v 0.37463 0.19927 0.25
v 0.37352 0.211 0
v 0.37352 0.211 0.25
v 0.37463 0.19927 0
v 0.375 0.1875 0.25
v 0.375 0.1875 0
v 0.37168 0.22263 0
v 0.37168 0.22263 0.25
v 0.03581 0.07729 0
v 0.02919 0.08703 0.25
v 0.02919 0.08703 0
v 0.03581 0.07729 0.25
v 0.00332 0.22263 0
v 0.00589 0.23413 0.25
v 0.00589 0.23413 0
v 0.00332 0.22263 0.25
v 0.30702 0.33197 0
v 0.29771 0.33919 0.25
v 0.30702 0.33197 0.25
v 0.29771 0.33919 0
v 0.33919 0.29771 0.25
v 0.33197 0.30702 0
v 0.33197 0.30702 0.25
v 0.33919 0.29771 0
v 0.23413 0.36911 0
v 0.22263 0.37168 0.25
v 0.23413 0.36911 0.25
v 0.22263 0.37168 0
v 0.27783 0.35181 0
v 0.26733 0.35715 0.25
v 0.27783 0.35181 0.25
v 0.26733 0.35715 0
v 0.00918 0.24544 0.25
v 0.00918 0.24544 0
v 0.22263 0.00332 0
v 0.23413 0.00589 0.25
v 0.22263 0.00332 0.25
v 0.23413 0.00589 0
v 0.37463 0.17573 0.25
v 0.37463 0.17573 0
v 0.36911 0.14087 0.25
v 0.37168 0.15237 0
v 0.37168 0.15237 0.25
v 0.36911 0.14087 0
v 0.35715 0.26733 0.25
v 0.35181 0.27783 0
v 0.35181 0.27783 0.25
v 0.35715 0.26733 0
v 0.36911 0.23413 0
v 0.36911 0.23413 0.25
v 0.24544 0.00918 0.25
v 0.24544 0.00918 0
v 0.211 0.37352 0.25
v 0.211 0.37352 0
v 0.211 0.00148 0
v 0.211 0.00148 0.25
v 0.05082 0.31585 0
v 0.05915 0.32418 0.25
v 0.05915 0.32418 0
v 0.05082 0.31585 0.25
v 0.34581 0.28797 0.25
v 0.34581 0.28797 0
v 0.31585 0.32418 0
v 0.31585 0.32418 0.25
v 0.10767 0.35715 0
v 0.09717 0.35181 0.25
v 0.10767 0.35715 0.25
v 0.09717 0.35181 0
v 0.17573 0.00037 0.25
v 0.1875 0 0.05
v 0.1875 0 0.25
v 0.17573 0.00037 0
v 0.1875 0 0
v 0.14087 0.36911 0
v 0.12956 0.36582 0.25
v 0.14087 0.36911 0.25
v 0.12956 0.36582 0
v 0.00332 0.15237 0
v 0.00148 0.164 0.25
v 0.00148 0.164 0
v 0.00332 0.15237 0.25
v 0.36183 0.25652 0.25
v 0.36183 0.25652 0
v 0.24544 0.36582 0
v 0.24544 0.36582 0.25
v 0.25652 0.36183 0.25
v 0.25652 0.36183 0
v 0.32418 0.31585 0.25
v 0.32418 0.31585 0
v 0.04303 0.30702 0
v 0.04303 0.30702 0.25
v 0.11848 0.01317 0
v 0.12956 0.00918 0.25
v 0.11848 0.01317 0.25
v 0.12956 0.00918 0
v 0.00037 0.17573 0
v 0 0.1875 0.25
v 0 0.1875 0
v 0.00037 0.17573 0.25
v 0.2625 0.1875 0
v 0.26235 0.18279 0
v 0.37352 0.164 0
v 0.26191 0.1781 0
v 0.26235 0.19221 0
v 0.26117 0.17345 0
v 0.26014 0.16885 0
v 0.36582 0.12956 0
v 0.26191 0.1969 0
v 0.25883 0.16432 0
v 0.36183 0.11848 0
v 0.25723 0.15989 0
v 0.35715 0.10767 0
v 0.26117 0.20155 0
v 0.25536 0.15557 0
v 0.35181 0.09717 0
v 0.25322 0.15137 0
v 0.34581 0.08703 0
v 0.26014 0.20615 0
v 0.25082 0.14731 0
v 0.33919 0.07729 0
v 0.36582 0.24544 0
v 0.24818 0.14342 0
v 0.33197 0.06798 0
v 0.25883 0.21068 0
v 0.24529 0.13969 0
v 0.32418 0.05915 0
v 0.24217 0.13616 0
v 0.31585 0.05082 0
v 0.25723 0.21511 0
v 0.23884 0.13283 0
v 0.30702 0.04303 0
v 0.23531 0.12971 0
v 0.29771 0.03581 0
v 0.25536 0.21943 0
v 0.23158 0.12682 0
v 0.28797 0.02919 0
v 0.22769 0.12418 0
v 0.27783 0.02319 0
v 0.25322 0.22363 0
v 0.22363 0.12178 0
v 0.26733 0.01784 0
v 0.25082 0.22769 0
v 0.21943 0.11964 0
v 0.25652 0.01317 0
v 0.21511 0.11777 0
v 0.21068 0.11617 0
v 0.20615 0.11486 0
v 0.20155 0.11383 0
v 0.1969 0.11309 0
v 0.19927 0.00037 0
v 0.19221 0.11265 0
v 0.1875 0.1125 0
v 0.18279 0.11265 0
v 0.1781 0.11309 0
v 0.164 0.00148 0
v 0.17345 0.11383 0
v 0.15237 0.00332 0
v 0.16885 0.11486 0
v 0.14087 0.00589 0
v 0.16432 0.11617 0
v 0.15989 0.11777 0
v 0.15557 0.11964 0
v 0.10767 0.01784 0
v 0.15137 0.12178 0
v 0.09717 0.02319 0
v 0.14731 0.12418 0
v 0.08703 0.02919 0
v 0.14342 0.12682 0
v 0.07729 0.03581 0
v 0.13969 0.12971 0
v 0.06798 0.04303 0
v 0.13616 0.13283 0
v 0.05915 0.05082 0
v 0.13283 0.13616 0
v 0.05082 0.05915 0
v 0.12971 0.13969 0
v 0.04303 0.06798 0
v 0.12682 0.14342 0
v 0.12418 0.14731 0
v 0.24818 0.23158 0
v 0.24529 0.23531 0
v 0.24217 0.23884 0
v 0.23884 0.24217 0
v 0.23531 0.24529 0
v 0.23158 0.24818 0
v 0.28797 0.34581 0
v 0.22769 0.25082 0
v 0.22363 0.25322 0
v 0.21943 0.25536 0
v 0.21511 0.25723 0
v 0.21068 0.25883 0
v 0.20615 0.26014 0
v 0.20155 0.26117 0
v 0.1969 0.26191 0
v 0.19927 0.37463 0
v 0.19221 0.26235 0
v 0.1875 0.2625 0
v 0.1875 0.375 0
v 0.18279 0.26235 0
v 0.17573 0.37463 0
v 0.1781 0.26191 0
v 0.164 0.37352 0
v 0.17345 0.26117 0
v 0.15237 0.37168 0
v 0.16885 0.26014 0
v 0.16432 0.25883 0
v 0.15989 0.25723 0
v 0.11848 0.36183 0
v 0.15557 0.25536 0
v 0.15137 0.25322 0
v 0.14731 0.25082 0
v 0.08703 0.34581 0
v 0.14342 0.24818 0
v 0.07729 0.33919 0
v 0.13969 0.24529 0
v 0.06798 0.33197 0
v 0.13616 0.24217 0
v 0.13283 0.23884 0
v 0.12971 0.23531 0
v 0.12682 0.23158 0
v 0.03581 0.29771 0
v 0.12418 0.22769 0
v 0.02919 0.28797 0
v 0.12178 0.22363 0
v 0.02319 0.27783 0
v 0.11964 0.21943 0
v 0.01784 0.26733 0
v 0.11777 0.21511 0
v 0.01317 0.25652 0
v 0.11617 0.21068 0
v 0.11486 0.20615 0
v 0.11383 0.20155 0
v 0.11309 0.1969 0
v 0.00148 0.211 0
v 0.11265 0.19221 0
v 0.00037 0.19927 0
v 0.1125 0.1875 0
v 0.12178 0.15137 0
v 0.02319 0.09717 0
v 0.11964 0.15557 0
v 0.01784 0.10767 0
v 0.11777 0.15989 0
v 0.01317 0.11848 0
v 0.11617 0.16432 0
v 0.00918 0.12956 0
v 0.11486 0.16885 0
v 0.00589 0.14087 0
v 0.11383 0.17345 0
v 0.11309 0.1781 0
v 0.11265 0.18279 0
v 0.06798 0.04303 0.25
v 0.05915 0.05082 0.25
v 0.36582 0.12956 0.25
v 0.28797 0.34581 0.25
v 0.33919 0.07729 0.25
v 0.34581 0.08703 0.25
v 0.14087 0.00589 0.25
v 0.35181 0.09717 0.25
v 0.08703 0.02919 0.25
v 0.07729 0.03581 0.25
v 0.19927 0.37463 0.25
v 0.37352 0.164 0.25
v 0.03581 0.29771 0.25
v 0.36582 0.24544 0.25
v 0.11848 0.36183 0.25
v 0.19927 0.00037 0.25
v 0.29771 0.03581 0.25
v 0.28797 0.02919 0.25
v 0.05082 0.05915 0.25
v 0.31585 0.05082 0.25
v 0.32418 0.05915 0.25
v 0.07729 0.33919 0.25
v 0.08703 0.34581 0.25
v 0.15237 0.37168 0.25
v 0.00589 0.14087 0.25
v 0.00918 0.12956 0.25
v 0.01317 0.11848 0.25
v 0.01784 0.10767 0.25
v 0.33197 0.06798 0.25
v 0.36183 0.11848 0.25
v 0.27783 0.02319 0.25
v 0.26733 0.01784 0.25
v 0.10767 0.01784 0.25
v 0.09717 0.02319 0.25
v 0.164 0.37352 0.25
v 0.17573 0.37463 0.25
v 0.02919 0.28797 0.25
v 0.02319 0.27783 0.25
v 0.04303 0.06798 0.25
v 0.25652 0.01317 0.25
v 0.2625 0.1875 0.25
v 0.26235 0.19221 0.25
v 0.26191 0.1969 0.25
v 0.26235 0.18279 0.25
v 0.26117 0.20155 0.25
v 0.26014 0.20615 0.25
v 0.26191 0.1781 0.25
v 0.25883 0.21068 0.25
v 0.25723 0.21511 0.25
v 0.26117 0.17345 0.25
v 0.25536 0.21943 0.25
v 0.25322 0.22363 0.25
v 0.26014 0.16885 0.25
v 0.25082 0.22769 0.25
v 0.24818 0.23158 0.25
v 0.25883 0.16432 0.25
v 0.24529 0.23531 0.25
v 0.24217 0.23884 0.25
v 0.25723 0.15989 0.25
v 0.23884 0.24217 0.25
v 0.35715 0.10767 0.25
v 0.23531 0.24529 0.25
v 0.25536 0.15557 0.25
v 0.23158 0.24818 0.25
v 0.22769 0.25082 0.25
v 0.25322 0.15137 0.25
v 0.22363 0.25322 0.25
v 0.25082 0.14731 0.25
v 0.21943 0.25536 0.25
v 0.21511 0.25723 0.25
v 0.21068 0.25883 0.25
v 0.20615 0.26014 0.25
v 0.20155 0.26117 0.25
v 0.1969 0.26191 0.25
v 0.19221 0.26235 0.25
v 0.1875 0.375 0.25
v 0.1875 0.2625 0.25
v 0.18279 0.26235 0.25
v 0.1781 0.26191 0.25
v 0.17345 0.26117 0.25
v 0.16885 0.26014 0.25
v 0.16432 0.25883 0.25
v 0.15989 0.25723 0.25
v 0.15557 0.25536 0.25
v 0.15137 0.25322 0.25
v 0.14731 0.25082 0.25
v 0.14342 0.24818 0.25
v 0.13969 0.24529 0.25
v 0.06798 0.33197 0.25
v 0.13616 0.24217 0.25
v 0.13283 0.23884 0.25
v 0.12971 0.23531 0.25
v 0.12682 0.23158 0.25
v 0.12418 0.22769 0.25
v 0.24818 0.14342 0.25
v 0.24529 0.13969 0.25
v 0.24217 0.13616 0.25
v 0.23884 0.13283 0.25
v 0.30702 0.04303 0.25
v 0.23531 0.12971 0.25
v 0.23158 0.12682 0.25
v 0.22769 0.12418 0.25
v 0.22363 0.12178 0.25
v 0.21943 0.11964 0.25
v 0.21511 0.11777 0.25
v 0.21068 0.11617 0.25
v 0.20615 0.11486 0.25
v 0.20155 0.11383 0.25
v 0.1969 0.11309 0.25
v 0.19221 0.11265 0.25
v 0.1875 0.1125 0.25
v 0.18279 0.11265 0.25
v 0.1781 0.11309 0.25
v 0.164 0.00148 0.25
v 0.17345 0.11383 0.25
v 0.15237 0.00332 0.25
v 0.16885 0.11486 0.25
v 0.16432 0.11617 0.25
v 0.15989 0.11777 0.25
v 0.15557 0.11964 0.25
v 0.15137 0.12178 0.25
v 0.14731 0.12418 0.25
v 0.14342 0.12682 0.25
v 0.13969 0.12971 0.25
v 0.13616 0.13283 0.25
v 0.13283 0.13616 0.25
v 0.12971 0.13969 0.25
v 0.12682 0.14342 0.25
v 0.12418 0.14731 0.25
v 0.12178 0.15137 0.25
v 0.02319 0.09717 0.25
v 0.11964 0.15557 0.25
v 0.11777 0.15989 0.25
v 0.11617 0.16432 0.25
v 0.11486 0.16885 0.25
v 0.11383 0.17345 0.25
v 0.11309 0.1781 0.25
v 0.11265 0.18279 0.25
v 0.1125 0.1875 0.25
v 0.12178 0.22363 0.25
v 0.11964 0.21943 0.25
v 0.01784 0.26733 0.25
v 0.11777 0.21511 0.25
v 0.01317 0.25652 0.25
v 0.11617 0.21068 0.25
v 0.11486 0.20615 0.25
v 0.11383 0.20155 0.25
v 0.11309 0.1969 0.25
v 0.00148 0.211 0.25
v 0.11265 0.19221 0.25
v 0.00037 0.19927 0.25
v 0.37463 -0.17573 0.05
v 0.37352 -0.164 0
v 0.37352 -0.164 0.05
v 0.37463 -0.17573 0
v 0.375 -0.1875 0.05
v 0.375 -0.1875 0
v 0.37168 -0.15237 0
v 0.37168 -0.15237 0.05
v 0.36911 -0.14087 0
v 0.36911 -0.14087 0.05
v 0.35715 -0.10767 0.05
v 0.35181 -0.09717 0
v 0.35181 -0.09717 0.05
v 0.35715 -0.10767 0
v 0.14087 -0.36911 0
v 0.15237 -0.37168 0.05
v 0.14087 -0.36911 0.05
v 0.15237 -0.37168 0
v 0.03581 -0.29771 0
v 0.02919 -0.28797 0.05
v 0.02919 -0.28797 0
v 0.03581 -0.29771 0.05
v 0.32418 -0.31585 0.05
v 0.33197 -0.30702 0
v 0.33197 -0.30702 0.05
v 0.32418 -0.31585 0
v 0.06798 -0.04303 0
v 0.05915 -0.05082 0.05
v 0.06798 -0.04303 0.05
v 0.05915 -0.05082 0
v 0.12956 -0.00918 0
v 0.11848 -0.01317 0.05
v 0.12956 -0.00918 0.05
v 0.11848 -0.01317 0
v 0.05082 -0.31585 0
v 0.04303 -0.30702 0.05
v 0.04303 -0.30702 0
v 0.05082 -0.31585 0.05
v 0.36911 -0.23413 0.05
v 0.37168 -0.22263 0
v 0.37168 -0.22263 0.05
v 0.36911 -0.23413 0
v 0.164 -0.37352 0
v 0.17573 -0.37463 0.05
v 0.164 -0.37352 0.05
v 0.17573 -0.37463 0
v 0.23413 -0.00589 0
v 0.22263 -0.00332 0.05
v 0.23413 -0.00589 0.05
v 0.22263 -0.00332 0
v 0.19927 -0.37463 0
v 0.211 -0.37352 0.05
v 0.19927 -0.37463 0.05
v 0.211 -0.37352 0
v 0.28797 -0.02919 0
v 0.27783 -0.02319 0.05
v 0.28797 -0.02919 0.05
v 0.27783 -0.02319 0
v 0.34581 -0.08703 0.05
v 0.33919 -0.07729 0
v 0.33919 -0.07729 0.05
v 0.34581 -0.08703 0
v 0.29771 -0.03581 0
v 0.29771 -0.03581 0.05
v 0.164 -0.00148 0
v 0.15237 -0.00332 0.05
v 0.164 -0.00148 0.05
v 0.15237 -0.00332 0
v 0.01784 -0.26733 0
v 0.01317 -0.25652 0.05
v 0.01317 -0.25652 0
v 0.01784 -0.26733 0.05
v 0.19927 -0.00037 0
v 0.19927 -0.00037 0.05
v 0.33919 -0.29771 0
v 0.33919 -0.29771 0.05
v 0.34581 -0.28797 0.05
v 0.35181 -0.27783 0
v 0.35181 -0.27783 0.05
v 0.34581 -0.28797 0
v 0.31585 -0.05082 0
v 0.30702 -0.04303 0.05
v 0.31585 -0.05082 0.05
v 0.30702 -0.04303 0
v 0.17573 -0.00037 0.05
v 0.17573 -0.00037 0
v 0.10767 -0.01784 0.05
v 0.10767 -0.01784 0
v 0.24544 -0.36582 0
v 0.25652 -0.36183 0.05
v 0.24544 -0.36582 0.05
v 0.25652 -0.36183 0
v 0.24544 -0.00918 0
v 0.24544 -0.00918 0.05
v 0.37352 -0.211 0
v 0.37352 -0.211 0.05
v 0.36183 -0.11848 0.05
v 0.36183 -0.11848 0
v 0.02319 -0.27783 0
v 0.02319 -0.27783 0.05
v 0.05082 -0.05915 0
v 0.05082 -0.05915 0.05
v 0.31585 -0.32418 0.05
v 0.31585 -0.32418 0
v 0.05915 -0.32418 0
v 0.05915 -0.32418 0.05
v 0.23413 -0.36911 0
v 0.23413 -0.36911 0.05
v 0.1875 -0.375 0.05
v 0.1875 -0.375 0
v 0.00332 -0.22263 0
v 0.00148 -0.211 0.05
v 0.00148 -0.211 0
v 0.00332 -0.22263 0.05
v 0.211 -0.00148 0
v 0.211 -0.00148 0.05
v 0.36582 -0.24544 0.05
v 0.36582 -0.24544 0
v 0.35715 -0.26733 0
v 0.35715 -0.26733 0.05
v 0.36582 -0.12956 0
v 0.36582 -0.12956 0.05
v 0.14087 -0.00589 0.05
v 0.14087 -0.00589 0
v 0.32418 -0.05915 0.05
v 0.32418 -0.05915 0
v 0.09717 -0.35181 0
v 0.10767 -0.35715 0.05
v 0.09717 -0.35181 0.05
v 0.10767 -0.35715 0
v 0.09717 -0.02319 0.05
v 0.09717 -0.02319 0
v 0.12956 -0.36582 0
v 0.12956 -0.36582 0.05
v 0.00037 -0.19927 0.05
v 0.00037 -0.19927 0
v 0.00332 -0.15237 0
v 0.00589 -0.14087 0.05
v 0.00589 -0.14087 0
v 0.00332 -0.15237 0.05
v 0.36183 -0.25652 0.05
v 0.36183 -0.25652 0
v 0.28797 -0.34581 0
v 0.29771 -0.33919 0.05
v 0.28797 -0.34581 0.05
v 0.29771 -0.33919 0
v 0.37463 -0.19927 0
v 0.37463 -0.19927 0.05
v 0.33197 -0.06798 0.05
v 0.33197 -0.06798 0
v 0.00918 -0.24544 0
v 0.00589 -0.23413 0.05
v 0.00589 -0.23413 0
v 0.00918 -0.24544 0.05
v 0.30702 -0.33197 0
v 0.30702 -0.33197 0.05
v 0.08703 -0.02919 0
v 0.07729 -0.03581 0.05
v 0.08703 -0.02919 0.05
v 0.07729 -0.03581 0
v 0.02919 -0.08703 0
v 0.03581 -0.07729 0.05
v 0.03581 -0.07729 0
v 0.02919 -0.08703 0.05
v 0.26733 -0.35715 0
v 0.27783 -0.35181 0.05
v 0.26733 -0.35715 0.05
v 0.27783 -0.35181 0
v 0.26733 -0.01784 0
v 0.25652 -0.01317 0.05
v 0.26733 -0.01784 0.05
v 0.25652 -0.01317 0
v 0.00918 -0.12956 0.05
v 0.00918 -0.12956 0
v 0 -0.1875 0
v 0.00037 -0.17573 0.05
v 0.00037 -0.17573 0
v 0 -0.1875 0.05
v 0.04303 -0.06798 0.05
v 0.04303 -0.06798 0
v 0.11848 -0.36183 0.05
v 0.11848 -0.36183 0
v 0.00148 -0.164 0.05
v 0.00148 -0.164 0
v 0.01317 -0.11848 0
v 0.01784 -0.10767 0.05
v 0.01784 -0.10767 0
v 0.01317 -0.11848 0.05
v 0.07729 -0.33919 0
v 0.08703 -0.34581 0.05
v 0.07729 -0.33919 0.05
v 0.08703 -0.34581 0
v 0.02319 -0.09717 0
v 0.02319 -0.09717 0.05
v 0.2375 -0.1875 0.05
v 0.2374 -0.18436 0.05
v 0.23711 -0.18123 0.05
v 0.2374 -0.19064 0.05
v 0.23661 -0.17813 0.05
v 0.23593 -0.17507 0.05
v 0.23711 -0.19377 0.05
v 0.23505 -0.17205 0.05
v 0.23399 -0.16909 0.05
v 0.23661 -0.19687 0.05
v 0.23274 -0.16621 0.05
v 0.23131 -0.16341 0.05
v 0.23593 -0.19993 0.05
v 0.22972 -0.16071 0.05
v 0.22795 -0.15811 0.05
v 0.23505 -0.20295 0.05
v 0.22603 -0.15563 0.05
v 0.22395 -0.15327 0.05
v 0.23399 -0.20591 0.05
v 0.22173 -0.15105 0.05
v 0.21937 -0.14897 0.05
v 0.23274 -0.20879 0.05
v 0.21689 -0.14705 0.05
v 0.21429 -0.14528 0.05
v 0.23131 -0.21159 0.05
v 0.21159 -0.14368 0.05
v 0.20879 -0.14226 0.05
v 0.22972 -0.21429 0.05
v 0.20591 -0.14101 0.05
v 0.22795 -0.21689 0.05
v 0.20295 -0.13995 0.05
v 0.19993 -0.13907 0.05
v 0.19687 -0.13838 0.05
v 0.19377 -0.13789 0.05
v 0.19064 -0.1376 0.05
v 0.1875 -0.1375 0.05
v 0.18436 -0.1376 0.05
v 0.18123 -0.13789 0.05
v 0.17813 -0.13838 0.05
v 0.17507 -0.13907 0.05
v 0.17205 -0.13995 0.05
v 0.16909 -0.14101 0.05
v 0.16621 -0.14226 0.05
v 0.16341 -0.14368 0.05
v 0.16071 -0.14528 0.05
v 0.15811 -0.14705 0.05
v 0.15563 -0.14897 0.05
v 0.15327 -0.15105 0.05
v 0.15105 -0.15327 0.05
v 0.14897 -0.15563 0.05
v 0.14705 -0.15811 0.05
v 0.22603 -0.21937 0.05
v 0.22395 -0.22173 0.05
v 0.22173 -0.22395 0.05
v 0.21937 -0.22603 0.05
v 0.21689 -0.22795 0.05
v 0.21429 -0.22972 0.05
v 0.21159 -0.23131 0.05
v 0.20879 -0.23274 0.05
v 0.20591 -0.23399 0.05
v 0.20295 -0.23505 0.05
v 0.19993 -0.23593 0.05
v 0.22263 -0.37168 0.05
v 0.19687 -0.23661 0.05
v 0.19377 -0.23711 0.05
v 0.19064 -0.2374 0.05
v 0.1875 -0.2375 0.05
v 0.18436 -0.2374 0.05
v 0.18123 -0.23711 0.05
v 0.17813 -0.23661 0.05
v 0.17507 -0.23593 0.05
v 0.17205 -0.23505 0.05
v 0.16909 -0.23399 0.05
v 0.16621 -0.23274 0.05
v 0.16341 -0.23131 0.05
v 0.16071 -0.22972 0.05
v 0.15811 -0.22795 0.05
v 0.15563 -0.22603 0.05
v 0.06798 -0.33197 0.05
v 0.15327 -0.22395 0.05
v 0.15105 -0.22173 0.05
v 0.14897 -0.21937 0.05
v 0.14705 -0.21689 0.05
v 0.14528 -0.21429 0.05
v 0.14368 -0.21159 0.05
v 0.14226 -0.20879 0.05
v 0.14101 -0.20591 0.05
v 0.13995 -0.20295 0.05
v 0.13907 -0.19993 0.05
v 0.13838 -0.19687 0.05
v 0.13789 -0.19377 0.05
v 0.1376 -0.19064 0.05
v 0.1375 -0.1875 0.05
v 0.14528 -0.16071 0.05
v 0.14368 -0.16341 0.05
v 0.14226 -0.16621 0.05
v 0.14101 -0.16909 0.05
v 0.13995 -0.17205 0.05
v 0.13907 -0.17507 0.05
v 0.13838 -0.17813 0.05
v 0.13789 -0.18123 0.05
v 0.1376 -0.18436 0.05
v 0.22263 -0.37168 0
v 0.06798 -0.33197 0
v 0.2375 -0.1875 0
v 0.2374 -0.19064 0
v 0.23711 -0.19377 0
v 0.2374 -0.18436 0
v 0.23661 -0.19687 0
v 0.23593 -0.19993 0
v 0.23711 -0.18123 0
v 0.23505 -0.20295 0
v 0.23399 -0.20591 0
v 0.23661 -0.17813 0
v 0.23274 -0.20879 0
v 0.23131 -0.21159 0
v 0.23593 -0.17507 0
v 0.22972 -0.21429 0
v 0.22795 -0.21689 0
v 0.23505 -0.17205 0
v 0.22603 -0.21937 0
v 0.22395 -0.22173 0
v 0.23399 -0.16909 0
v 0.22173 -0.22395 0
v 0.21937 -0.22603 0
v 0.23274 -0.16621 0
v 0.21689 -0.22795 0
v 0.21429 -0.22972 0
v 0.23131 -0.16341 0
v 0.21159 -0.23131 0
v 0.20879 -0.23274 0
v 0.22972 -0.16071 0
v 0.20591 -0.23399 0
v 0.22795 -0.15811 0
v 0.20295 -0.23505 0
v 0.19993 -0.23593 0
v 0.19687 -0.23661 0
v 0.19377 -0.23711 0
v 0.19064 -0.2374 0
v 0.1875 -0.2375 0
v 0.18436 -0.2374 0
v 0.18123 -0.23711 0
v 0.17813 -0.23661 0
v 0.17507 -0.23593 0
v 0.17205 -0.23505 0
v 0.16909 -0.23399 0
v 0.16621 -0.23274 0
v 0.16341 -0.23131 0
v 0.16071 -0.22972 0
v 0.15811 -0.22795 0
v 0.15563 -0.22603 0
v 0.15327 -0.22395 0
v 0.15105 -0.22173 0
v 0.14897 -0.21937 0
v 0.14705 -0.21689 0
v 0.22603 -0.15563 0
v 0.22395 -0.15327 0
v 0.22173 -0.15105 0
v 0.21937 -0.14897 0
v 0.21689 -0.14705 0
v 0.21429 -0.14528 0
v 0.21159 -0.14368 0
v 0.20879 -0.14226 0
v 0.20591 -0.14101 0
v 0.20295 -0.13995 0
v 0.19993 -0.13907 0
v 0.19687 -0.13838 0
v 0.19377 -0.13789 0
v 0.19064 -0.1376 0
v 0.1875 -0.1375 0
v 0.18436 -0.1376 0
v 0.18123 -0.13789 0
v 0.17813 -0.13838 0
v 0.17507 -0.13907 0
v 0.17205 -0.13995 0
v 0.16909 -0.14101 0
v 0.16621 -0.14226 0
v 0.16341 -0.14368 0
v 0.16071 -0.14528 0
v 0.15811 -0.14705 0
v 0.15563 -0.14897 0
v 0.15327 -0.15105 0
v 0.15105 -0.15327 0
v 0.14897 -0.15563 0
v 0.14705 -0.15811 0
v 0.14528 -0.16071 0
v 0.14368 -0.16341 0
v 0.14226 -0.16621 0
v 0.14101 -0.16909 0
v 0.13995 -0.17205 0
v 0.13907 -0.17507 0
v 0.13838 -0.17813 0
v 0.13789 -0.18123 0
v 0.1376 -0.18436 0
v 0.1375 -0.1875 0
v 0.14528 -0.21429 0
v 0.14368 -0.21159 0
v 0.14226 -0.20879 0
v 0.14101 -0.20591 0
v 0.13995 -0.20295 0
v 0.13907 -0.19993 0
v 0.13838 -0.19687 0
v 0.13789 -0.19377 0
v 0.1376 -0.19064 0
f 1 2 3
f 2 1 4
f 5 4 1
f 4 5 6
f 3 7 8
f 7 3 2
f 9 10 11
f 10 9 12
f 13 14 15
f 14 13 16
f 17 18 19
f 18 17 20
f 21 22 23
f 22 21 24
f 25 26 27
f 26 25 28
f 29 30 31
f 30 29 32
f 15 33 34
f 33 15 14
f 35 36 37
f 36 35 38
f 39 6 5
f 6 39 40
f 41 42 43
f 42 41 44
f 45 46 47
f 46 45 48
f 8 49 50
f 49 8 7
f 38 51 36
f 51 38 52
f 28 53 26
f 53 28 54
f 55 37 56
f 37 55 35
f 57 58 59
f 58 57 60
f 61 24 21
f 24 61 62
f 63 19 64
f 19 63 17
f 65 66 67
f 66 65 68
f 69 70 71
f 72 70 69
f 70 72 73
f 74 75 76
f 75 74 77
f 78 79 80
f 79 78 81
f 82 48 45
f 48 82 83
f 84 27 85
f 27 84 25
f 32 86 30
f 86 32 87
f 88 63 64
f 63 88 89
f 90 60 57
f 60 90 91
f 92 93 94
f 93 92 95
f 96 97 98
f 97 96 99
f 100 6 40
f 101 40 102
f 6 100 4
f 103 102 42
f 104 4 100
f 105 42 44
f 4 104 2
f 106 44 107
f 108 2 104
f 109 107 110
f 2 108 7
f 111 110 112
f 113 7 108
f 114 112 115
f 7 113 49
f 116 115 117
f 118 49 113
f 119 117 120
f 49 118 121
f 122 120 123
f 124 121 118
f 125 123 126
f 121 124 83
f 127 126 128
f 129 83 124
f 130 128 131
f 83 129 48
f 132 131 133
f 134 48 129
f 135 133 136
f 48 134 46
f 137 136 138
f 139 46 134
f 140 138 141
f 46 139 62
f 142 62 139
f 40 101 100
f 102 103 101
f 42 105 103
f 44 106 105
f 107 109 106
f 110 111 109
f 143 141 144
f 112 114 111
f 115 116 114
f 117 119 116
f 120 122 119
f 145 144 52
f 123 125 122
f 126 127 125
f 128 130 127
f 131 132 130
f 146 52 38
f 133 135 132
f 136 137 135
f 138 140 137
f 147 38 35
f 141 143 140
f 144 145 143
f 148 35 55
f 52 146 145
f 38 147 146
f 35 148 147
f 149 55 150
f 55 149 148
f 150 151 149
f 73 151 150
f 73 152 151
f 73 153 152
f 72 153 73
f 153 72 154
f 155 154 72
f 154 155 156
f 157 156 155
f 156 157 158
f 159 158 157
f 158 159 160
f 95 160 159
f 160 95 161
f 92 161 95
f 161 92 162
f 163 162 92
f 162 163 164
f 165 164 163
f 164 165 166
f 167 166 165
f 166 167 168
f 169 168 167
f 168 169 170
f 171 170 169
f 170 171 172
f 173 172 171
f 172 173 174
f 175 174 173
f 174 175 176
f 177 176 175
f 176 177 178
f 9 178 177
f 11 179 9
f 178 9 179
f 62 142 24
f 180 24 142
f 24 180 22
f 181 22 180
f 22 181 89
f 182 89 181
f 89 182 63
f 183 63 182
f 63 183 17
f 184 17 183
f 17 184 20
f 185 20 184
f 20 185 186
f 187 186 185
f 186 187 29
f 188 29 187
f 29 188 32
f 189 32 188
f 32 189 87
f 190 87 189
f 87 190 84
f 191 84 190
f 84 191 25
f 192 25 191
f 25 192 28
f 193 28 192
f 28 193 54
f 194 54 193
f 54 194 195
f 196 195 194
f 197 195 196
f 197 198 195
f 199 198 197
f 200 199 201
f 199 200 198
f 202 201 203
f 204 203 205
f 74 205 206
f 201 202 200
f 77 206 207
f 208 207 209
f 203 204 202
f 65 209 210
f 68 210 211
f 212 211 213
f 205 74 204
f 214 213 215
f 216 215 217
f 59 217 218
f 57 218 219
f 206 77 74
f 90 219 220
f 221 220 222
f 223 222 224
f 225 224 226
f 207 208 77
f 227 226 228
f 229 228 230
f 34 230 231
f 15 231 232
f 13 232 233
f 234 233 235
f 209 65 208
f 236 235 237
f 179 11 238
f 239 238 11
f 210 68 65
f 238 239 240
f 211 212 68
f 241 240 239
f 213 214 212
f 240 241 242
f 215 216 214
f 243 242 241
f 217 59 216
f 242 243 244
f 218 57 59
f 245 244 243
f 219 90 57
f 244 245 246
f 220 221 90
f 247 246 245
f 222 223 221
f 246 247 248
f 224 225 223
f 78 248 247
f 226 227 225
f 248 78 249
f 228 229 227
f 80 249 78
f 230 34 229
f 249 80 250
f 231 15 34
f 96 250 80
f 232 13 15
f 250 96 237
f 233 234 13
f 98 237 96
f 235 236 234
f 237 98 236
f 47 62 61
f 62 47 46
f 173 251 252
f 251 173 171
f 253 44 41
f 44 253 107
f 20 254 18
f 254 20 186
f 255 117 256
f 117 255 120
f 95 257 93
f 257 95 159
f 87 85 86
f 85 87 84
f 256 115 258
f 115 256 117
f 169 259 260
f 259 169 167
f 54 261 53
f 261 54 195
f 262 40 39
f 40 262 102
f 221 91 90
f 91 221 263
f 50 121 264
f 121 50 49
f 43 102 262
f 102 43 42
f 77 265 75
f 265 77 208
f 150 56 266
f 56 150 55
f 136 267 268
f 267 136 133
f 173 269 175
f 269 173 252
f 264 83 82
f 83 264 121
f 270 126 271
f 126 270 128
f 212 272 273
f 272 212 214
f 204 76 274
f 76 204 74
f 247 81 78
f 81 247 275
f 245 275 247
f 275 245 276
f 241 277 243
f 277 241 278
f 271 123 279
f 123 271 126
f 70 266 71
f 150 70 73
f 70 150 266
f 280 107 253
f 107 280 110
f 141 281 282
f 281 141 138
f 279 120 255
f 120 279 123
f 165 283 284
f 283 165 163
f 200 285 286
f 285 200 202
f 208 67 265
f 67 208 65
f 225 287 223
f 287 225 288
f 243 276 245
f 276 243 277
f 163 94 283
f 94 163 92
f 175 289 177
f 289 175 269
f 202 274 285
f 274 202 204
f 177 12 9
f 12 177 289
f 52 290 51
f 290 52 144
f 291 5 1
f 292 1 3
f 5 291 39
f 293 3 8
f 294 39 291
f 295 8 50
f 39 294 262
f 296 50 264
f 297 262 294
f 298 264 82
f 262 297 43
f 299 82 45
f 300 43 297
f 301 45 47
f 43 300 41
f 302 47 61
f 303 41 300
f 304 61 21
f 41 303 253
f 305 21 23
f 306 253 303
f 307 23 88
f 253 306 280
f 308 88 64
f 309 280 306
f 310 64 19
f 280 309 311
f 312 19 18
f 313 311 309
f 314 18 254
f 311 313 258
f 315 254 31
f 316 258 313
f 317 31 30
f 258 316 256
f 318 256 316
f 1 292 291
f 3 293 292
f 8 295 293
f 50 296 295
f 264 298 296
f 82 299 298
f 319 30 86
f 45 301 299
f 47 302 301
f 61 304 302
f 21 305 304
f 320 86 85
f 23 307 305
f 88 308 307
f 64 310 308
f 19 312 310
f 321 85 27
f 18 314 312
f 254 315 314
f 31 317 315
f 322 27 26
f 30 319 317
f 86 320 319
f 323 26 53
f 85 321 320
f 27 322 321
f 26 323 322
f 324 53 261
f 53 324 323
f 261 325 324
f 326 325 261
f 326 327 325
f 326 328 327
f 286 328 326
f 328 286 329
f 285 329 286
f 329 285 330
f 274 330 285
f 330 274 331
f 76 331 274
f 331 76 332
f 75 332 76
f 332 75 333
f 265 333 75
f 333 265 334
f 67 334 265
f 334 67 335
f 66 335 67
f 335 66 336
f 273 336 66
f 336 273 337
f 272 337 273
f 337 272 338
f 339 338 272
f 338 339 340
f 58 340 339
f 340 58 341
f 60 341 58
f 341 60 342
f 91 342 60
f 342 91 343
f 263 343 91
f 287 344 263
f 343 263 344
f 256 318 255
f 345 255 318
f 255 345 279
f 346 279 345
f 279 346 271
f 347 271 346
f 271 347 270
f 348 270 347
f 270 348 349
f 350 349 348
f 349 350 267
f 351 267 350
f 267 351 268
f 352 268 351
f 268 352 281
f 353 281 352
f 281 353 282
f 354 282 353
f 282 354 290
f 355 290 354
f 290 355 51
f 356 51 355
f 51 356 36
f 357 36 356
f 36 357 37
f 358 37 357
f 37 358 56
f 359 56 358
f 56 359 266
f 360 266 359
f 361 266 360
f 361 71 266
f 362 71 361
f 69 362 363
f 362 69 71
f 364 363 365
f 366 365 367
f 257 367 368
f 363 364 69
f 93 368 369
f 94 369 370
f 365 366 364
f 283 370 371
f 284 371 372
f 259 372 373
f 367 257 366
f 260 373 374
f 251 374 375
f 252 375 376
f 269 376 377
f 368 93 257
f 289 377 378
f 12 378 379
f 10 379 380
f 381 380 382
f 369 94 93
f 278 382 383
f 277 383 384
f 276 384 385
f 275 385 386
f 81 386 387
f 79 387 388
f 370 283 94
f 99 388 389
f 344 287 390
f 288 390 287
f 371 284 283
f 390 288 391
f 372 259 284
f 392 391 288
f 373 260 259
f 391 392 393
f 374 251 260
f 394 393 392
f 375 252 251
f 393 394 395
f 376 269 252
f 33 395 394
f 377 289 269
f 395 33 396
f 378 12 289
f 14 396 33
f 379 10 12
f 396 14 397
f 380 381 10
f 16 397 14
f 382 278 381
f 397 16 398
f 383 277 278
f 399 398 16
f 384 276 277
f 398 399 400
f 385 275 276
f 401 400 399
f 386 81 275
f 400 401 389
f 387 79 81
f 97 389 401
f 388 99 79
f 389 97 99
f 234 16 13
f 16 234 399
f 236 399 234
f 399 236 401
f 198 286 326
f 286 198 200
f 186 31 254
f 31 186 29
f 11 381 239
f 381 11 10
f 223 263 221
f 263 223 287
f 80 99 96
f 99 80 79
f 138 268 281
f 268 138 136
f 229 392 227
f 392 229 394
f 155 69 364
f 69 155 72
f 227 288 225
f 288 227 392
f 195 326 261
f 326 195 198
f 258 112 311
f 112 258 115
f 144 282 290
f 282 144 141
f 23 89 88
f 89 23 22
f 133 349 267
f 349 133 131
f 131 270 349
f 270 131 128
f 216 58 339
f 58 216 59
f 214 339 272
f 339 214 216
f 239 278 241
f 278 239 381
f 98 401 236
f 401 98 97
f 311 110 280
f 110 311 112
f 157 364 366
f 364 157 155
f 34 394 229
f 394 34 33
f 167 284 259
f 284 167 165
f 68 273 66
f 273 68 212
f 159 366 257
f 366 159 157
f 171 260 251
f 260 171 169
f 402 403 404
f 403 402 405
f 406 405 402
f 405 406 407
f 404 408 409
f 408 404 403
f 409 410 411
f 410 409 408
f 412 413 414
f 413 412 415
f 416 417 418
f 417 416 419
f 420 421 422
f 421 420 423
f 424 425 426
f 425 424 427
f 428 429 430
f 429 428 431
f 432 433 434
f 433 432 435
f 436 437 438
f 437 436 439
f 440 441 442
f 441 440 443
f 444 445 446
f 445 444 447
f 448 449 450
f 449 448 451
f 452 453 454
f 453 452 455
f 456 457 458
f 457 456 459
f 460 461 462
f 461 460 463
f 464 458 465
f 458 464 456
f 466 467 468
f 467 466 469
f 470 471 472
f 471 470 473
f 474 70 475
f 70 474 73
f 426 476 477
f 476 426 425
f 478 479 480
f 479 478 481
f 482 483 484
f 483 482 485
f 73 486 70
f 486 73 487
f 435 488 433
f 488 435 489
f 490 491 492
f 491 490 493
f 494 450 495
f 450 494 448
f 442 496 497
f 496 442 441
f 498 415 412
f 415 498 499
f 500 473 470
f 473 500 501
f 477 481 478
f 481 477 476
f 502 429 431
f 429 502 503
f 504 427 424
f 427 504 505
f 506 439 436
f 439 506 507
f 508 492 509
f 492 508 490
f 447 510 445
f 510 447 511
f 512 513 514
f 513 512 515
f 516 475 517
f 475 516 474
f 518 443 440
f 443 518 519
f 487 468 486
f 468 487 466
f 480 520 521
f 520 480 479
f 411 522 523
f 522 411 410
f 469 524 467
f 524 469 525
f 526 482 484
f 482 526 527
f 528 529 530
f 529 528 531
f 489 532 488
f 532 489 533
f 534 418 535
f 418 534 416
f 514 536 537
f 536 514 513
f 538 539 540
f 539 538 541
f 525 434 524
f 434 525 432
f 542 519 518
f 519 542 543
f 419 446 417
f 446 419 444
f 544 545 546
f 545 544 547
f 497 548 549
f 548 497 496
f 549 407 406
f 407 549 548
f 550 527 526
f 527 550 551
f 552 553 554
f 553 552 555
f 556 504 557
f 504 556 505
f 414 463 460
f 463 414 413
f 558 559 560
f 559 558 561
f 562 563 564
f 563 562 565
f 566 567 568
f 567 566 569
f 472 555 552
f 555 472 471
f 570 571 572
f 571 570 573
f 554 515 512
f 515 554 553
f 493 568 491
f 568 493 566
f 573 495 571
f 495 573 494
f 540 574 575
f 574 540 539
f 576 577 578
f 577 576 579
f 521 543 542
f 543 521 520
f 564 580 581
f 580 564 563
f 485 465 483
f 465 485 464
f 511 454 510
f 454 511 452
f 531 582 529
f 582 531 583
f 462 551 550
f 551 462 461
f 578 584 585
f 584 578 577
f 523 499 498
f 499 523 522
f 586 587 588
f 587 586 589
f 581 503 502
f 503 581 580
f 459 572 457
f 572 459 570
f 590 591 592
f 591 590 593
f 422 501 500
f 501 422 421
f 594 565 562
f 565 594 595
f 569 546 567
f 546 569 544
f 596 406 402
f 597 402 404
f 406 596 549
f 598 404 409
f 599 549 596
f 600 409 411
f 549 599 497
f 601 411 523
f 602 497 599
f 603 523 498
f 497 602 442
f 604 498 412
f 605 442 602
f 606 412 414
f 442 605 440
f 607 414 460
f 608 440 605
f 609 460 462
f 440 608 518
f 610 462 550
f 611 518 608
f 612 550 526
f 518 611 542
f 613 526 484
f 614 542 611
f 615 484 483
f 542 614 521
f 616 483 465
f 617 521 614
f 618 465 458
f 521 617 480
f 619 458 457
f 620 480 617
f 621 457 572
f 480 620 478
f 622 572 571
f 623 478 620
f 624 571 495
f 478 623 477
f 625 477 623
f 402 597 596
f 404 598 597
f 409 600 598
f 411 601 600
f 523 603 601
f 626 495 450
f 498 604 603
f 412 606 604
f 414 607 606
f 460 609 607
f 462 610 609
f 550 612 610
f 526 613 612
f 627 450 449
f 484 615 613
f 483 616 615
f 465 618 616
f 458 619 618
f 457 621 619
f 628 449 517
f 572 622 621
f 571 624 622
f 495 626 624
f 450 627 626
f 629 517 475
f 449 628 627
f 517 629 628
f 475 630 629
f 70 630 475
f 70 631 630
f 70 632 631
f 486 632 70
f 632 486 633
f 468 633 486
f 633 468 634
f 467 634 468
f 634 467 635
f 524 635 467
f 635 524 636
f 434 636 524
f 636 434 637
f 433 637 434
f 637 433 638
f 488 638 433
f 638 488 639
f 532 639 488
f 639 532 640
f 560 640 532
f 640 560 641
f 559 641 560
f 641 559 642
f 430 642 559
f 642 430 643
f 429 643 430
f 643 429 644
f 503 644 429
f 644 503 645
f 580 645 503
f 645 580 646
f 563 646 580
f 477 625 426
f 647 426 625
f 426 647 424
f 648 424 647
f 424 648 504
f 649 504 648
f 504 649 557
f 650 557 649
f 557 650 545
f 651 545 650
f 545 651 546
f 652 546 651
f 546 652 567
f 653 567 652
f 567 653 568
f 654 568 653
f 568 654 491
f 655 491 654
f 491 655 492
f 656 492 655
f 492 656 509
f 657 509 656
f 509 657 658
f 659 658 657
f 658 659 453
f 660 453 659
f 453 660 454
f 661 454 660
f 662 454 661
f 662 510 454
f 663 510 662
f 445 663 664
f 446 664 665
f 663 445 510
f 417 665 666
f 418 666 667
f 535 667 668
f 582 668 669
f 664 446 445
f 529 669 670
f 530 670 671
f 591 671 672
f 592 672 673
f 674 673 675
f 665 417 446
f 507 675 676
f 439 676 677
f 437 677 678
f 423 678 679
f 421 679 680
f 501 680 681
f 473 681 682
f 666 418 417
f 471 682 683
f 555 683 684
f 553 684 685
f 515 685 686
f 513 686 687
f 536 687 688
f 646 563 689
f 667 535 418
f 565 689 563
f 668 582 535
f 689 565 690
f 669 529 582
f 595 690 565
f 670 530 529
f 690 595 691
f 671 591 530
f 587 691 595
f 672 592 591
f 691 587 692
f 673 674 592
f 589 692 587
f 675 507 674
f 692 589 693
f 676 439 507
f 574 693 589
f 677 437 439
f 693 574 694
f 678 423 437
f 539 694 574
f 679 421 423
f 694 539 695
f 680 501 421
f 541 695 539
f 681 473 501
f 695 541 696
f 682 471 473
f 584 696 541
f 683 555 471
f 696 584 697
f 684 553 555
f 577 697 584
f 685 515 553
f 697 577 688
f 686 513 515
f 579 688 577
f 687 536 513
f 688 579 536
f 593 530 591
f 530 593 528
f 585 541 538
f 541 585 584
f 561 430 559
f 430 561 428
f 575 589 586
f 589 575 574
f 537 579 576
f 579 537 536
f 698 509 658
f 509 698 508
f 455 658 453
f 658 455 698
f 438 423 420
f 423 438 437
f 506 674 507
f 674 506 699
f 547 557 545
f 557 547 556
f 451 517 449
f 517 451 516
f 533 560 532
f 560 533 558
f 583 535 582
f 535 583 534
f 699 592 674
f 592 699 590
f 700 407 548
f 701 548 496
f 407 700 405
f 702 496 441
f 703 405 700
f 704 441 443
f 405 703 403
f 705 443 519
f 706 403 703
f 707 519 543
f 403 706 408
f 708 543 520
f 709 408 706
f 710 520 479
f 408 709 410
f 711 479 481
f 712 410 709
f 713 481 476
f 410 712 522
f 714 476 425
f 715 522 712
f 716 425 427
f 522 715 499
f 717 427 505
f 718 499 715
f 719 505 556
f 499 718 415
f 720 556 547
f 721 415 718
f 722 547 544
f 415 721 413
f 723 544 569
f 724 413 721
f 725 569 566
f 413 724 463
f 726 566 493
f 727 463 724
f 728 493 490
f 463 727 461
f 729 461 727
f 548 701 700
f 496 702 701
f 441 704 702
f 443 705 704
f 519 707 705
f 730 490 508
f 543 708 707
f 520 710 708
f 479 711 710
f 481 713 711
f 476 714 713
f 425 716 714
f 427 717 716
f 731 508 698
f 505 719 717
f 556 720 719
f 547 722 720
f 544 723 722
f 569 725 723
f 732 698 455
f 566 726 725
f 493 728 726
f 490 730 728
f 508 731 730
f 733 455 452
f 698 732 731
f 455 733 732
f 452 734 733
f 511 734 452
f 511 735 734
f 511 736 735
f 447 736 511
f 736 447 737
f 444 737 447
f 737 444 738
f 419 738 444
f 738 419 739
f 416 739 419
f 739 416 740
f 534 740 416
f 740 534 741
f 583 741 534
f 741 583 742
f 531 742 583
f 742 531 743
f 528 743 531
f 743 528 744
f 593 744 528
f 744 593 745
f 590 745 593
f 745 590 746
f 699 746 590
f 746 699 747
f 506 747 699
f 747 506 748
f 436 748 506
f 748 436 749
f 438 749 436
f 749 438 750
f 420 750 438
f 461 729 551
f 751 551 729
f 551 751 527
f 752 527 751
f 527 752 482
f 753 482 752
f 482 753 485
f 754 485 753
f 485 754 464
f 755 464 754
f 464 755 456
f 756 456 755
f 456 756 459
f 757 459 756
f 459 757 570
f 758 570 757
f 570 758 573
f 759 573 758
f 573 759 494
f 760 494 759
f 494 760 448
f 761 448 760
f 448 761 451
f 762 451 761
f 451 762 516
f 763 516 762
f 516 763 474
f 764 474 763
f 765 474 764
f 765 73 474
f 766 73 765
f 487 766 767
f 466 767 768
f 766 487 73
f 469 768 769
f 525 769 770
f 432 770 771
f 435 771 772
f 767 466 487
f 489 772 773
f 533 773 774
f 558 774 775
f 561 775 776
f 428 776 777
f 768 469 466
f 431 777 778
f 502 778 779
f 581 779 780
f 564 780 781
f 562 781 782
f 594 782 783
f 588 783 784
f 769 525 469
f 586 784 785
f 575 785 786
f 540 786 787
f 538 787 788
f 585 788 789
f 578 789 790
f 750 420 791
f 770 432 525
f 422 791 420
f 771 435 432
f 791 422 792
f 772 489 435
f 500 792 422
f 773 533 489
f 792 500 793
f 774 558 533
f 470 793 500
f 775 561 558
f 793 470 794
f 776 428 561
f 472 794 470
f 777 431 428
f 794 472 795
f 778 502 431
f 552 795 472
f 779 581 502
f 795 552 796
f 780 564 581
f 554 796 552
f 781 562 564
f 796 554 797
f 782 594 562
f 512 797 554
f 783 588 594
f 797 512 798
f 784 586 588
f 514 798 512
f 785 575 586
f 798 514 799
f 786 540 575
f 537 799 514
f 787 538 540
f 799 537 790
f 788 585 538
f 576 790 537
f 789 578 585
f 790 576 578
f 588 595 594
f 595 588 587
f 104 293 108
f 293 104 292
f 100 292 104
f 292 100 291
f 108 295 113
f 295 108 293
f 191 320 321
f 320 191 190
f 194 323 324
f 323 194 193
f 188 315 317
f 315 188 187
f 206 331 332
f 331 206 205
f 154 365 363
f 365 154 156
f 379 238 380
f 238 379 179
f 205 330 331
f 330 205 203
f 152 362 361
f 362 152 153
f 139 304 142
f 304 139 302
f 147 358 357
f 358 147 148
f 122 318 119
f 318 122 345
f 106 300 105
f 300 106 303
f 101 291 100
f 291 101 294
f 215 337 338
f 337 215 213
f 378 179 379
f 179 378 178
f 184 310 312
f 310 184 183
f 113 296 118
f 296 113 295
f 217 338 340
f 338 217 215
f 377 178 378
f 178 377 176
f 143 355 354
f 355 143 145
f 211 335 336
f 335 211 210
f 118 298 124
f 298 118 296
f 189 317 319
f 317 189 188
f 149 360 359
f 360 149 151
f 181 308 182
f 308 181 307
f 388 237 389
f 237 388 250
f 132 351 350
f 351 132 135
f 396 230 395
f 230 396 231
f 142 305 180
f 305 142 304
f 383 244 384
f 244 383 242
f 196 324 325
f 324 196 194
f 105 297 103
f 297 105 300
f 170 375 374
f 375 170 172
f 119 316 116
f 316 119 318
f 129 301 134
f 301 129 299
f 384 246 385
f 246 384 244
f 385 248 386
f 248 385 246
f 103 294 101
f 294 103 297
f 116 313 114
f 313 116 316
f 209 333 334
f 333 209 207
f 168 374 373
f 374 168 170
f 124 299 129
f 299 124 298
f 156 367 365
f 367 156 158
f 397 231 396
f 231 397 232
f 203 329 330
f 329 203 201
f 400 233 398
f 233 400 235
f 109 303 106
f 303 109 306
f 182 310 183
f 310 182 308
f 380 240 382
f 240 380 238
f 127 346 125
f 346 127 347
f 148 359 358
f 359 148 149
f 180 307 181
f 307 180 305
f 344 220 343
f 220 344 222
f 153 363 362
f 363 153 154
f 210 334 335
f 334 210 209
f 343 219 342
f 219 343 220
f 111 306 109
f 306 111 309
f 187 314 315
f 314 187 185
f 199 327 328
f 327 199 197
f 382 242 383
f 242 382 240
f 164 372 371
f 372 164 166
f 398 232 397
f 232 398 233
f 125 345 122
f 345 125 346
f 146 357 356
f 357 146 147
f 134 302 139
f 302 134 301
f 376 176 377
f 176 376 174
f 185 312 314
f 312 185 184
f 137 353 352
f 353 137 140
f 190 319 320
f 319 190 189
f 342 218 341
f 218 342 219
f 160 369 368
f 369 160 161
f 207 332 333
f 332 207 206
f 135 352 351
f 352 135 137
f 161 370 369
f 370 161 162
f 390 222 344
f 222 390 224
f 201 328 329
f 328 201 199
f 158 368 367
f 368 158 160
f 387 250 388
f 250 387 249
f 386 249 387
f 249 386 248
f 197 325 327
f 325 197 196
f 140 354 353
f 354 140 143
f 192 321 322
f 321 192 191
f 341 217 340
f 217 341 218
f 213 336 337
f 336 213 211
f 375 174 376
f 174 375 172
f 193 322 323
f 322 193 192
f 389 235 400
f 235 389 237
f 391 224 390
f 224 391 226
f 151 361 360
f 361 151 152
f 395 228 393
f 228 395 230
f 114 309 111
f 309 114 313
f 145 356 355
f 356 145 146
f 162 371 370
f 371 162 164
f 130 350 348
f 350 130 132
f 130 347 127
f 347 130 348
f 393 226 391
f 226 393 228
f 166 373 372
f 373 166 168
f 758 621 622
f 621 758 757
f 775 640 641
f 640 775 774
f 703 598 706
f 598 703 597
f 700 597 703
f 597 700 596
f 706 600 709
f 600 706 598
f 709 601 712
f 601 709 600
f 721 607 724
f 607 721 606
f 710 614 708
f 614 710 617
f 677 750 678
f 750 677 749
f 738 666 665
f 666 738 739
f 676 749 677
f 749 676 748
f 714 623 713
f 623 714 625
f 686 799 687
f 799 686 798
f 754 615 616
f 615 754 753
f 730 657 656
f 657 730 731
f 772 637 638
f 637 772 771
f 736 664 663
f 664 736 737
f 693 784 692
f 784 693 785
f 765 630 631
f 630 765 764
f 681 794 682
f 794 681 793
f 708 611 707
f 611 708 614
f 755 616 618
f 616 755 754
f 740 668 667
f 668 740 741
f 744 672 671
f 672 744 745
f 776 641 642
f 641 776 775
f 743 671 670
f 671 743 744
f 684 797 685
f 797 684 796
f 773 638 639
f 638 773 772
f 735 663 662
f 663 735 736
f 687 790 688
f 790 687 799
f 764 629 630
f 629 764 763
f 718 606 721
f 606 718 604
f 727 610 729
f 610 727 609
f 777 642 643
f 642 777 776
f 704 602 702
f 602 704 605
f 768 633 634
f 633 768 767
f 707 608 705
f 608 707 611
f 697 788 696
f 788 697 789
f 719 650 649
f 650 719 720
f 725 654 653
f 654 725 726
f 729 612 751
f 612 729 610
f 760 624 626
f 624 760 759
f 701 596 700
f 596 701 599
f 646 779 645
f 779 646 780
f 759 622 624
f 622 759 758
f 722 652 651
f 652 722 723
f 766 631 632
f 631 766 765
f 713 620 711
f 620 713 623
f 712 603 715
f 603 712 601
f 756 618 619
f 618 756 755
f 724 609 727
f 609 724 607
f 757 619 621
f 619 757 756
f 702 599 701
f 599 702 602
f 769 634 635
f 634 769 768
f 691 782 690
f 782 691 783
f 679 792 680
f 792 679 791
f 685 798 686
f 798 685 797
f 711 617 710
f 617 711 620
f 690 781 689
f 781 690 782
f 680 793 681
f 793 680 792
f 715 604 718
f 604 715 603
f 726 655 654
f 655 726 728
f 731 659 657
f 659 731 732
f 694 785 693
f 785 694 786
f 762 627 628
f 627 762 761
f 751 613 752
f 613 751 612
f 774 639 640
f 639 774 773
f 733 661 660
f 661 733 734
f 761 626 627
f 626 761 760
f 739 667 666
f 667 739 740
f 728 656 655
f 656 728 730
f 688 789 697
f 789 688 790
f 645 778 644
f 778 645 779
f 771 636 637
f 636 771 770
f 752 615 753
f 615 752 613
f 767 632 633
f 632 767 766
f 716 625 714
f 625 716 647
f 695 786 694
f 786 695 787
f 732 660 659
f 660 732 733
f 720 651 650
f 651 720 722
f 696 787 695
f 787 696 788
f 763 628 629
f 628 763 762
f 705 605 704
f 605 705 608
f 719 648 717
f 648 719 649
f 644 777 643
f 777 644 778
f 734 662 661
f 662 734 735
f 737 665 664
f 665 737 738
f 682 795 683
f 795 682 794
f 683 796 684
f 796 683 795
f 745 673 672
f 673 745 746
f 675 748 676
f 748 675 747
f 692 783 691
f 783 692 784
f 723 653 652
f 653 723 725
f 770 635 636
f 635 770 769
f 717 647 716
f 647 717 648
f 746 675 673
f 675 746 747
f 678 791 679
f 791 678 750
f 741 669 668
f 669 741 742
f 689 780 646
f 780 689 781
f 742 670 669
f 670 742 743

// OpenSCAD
// Parametric Variables
ref_length = 0.375;
ref_width = 0.375;
ref_height = 0.25;

main_cx = 0.1875;
main_cy = 0.1875;
main_r = 0.1875;
main_h = 0.25;
main_bore_r = 0.075;

tab_cx = 0.1875;
tab_cy = -0.1875;
tab_r = 0.1875;
tab_h = 0.05;
tab_bore_r = 0.05;

cut_cx = 0.1875;
cut_cy = 0.1875;
cut_r = 0.075;
cut_h = 0.125;

$fn = 100;

// Main Assembly
difference() {
    // Union of main sleeve and shallow tab
    union() {
        translate([main_cx, main_cy, 0])
            cylinder(h=main_h, r=main_r, center=false);
        translate([tab_cx, tab_cy, 0])
            cylinder(h=tab_h, r=tab_r, center=false);
    }

    // Main central through bore
    translate([main_cx, main_cy, -0.1])
        cylinder(h=main_h + 0.2, r=main_bore_r, center=false);

    // Tab centered through opening
    translate([tab_cx, tab_cy, -0.1])
        cylinder(h=tab_h + 0.2, r=tab_bore_r, center=false);

    // Underside recess/cut (circular profile)
    translate([cut_cx, cut_cy, 0])
        cylinder(h=cut_h, r=cut_r, center=false);
}
